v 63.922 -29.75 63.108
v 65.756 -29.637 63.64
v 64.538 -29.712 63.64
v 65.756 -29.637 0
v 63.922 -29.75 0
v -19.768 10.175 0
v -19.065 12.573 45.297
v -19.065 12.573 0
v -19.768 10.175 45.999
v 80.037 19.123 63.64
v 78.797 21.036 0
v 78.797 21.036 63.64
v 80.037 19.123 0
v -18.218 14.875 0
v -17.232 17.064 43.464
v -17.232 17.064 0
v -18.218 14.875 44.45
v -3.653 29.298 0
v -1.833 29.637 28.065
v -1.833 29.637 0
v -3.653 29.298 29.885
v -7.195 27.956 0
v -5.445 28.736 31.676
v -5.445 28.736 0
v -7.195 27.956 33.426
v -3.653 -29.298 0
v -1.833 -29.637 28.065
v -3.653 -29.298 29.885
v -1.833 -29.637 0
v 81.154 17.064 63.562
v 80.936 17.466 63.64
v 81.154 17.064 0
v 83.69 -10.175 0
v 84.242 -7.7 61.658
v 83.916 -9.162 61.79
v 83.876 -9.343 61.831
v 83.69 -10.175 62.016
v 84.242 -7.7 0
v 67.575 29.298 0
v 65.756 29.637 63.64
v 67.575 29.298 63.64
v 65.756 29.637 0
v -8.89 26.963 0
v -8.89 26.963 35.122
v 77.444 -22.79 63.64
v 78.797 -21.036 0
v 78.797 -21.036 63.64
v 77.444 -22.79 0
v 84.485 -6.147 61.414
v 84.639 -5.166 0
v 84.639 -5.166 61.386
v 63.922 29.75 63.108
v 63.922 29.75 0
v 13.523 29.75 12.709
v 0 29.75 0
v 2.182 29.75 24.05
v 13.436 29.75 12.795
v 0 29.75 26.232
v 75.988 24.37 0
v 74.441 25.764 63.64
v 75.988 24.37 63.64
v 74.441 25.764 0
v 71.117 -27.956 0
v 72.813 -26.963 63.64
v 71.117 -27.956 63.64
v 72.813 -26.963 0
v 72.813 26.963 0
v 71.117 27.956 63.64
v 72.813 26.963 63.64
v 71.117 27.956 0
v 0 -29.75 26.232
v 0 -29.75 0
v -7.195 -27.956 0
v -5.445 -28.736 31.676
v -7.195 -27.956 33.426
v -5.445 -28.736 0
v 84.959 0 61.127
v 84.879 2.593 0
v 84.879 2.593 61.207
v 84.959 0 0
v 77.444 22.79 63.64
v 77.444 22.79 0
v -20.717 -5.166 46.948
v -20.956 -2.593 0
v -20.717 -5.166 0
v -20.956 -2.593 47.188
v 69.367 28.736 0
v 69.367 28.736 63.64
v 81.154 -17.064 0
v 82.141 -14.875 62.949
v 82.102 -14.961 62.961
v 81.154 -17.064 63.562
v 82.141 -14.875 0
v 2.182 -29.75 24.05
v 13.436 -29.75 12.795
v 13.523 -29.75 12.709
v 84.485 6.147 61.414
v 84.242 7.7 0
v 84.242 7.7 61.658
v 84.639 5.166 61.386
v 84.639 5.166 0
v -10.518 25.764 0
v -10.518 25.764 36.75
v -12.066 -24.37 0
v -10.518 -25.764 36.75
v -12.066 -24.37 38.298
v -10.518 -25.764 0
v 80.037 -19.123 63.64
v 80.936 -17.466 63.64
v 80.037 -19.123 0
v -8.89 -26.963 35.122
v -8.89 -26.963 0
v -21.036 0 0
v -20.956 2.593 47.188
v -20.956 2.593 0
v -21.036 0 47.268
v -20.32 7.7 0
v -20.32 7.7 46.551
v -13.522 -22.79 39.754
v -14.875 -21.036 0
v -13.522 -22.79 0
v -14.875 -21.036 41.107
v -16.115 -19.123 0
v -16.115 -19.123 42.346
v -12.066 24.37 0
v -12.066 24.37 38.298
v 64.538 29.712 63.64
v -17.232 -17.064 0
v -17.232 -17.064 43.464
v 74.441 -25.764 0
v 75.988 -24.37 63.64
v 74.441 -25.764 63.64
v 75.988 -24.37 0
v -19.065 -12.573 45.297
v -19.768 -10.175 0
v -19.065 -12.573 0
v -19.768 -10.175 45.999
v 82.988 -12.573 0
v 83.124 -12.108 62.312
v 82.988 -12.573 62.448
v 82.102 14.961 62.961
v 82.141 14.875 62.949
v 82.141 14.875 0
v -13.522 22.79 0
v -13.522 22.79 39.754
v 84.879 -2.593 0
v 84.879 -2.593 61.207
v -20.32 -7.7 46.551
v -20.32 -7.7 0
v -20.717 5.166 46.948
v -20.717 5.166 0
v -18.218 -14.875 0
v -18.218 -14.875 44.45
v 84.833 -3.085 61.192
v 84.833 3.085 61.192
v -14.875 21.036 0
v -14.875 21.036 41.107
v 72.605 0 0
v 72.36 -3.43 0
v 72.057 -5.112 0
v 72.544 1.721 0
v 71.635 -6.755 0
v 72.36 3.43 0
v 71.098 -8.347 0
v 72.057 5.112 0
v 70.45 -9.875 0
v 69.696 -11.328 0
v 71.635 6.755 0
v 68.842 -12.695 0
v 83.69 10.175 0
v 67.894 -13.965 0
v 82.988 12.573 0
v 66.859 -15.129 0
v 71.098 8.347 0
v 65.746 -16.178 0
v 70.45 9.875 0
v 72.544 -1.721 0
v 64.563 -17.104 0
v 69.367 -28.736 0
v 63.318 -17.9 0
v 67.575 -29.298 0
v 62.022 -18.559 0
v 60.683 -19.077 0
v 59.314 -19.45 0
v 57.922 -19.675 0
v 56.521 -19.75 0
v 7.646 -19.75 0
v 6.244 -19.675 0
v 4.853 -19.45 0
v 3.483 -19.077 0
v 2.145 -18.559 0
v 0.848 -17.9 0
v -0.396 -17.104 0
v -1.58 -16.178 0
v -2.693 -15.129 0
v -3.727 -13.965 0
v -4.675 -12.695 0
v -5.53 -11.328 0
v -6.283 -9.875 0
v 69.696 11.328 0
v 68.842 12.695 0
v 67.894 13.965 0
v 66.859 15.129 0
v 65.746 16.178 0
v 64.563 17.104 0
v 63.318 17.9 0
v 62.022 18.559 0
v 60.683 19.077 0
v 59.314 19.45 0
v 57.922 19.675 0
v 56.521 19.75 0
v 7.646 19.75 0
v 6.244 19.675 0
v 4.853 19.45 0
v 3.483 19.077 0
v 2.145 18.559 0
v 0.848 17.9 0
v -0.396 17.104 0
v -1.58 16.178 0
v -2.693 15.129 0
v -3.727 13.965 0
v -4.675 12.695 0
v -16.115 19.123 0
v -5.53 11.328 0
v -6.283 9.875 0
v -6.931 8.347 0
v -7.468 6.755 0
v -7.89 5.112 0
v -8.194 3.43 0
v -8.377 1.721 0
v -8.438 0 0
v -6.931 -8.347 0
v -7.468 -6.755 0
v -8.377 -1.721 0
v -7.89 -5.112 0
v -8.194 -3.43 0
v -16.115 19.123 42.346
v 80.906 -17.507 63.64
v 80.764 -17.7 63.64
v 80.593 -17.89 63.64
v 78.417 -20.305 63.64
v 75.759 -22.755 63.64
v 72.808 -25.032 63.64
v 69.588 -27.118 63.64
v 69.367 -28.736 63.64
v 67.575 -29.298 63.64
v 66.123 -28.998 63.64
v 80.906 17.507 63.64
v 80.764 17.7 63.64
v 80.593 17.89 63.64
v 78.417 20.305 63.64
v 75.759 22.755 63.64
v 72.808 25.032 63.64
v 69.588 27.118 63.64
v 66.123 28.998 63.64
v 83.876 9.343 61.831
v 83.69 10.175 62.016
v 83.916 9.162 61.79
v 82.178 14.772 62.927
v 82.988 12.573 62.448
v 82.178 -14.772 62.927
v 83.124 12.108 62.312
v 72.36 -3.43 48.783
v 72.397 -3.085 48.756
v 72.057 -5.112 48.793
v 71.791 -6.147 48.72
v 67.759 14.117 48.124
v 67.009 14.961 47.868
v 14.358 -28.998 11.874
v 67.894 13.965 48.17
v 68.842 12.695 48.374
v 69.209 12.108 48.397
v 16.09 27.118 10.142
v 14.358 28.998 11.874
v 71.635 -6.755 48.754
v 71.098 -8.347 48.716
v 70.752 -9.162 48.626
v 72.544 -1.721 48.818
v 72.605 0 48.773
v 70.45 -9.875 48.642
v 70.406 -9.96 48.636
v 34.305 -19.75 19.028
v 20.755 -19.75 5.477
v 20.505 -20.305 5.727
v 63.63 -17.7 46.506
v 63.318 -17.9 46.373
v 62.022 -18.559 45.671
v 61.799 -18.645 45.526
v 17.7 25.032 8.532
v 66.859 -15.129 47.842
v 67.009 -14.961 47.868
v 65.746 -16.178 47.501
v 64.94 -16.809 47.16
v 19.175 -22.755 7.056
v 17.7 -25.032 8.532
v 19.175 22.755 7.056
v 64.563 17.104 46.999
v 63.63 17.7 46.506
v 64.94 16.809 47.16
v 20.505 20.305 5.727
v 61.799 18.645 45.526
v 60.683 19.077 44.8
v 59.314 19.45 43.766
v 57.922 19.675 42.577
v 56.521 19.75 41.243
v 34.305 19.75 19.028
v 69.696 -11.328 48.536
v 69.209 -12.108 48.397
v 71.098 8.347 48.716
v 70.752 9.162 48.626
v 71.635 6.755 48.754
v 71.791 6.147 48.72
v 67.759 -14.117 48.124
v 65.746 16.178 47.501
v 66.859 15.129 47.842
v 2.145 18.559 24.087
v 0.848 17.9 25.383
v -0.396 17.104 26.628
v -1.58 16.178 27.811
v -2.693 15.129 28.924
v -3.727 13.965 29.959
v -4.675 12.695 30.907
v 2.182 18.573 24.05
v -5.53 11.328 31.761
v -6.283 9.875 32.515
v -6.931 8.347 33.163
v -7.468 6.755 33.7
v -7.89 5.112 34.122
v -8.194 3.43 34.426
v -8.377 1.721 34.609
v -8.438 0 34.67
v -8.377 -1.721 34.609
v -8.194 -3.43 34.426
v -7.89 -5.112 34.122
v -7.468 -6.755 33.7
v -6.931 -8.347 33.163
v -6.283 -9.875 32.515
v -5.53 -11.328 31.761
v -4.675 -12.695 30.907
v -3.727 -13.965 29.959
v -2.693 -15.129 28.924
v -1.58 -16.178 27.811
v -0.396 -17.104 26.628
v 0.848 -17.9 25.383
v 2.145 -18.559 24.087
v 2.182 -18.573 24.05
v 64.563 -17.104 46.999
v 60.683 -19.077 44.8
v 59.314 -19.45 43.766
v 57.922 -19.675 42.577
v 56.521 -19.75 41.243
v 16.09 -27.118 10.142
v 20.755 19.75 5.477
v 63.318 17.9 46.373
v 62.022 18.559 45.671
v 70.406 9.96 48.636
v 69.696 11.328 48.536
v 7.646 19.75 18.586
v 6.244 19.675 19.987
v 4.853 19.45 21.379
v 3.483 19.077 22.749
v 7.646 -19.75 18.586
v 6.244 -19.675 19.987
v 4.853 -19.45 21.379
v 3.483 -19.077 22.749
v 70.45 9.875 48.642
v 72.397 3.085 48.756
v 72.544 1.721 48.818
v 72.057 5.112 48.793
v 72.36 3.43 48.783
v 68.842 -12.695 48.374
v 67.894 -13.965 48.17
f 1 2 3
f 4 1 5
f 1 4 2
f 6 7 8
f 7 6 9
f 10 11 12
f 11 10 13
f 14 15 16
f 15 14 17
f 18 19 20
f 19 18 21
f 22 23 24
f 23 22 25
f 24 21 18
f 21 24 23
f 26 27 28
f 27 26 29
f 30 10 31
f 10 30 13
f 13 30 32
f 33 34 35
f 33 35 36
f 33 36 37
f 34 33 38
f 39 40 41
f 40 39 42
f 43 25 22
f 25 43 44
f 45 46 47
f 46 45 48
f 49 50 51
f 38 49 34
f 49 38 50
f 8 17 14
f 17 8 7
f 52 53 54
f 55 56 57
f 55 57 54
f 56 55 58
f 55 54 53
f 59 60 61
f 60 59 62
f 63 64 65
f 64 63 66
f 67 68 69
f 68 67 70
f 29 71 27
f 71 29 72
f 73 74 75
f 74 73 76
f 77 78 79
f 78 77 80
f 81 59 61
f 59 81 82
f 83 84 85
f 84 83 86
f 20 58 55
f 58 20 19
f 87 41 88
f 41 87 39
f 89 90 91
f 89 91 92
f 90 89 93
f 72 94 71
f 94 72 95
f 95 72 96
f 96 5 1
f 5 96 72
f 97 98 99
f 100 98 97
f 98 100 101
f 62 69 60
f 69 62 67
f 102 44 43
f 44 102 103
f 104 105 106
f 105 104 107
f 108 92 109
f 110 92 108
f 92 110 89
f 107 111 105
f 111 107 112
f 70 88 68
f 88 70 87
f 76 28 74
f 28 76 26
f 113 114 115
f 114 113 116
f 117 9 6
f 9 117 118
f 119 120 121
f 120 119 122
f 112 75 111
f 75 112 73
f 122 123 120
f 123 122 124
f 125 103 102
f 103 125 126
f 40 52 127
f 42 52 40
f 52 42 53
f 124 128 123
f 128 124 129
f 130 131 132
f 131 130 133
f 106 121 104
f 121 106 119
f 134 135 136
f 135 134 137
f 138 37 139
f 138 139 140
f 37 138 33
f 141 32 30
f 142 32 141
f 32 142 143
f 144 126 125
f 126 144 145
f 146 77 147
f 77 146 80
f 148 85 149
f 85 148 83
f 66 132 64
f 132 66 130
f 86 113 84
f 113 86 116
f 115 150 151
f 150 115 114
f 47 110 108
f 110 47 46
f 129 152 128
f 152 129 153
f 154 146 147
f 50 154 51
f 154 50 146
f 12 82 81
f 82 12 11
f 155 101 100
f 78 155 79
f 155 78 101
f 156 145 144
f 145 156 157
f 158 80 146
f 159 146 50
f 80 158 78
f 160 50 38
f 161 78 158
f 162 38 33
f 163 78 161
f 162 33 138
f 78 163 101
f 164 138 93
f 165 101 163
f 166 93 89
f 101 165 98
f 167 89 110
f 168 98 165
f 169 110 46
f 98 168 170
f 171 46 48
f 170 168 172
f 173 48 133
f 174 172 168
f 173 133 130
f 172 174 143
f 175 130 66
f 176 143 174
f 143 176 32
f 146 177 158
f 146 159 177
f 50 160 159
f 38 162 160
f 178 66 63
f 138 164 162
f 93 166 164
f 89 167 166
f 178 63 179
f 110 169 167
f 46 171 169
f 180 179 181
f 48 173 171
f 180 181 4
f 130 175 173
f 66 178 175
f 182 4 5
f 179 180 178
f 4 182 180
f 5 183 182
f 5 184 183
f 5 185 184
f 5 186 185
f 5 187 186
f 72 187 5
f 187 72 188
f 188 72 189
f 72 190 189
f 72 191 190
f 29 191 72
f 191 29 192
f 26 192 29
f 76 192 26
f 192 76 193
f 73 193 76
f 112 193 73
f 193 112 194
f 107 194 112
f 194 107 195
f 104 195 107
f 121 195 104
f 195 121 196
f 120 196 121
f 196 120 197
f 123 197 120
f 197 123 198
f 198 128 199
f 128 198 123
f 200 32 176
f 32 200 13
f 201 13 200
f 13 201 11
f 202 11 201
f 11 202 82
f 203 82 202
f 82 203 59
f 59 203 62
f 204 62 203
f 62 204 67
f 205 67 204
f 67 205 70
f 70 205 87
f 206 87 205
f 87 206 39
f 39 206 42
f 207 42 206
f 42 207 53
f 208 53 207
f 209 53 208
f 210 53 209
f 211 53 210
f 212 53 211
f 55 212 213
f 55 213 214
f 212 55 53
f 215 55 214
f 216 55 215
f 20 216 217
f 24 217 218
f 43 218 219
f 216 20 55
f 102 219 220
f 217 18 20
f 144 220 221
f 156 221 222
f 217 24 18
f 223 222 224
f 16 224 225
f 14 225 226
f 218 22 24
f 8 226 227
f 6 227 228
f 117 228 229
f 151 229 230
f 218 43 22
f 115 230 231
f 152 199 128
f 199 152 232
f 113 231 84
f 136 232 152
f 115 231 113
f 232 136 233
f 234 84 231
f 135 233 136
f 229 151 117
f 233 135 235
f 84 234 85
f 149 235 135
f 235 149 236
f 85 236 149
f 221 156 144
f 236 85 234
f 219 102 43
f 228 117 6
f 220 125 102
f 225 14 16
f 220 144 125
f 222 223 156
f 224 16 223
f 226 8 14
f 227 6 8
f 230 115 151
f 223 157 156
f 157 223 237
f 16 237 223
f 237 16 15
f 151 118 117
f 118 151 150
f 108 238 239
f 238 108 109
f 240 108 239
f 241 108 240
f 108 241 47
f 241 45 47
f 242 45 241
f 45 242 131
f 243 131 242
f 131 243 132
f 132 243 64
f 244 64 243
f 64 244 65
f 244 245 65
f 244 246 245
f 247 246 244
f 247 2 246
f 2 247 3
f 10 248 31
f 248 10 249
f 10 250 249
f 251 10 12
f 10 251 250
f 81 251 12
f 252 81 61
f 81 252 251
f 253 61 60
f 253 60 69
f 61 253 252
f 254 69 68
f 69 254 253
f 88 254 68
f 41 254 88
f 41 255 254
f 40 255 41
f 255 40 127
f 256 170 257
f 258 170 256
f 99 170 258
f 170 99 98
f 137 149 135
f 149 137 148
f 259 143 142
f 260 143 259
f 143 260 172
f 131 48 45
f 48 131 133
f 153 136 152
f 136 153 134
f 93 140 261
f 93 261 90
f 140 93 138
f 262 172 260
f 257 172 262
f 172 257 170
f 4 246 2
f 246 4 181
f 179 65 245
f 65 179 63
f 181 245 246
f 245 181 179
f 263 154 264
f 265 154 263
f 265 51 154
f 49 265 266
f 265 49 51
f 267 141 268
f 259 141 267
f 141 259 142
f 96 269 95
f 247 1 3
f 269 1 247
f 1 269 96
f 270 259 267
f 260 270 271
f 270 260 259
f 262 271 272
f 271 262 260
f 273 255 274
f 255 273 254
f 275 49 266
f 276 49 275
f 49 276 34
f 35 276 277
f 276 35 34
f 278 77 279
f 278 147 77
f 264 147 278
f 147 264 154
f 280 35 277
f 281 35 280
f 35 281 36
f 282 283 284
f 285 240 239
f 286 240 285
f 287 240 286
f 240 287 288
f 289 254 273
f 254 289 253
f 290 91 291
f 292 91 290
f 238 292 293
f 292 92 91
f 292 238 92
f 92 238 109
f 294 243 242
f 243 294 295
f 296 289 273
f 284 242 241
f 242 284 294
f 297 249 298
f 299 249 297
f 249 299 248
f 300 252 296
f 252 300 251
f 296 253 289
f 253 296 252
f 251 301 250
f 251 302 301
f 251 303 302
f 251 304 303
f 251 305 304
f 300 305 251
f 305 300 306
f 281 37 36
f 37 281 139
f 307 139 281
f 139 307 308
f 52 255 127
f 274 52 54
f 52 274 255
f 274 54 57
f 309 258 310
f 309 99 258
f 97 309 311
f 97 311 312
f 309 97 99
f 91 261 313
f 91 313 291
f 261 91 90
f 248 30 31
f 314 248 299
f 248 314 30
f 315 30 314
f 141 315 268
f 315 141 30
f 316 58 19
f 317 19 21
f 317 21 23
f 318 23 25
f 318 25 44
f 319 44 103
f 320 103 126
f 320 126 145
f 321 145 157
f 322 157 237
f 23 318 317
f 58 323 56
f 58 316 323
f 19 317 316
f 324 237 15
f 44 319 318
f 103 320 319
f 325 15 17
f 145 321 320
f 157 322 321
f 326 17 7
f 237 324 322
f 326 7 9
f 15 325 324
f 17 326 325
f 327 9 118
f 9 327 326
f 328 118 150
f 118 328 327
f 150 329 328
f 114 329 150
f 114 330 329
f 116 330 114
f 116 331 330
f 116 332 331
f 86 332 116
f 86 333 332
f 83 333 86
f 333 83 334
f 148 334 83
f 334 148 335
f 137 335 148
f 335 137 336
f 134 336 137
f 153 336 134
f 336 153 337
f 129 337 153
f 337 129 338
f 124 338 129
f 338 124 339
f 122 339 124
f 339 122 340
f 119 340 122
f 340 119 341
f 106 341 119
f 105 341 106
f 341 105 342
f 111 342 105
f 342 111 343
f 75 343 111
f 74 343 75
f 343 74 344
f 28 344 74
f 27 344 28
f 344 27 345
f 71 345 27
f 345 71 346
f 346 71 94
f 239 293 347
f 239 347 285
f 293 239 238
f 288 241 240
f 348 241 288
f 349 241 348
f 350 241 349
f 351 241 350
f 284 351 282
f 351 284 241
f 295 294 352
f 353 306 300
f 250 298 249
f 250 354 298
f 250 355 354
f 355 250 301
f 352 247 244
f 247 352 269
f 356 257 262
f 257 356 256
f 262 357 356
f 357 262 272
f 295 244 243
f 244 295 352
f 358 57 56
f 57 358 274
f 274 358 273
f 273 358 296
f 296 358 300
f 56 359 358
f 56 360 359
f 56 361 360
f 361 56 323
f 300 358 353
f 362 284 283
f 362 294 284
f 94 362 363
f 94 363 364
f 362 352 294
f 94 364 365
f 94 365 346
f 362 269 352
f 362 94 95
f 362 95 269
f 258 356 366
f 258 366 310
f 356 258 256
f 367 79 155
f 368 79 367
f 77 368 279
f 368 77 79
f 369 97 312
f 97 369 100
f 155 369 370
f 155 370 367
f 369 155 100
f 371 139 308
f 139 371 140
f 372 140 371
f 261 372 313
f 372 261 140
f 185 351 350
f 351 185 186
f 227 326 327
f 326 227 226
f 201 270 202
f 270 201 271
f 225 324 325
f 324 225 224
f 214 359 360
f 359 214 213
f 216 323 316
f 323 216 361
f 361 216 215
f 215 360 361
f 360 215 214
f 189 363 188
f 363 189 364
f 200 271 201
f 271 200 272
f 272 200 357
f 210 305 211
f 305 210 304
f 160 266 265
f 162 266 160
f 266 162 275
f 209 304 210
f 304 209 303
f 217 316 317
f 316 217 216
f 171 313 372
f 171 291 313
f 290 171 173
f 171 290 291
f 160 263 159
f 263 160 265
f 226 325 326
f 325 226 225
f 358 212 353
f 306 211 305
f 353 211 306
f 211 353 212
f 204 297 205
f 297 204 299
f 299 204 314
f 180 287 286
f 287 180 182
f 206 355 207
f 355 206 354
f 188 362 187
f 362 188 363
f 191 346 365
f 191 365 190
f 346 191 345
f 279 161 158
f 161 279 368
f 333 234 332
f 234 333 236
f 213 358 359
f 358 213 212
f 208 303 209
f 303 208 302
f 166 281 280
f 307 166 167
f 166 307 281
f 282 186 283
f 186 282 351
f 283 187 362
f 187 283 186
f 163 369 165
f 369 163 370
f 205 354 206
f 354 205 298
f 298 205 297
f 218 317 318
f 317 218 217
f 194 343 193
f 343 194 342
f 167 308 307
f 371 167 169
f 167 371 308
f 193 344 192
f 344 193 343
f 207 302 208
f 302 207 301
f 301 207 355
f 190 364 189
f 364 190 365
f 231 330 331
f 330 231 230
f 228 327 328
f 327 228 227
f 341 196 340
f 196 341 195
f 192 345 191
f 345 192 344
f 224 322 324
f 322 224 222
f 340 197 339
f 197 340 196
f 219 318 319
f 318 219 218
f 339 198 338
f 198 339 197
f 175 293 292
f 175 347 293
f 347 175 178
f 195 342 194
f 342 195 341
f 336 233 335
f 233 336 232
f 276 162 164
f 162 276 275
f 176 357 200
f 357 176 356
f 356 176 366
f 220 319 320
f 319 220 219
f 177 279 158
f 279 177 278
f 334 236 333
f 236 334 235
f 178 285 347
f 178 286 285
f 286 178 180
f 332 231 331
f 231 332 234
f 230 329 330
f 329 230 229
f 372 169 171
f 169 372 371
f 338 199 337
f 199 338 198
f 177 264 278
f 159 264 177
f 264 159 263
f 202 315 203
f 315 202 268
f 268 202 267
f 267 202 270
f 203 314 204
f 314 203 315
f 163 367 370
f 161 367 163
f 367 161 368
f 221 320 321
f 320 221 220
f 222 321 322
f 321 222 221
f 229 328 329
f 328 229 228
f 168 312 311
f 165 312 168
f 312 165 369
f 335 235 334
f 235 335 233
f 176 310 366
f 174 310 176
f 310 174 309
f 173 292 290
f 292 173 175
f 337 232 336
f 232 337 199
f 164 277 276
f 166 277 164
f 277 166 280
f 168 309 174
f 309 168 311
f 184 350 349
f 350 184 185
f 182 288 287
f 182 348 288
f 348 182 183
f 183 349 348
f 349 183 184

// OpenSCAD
// -*- mode: SCAD ; c-file-style: "ellemtel" ; coding: utf-8 -*-
//
// NN
//
// © 2018 Roland Sieker <ospalh@gmail.com>
// Licence: CC-BY-SA 4.0


glass_diameter = 70; // [30:1:100]
glass_height = 90; // [20:1:200]
angle = 45; // [20:1:70]

// Percent of glass diameter
wedge_width = 85; // [50:1:99]

// How much border to be left
wedge_cutout_width = 10;

// Set this to “render” and click on “Create Thing” when done with the setup.
preview = 1; // [0:render, 1:preview]



/* [Hidden] */

// Done with the customizer

// *******************************************************
// Extra parameters. These can be changed reasonably safely.


w = 1.8;  // Wall width
p = 1.2;  // Bottom, top plate height
c = 0.4;  // Clearance

// *******************************************************
// Some shortcuts. These shouldn’t be changed

r_ge = glass_diameter/2 + c;
r_w = glass_diameter/2 * wedge_width/100;

tau = 2 * PI;  // π is still wrong. τ = ⌀ ÷ r

xy_factor = 1/tan(angle);
// To get from a height to a horizontal width inclined correctly
z_factor = tan(angle);  // The other way around
hb = glass_height*sin(angle);


ms = 0.01;  // Muggeseggele.

// fn for differently sized objects and fs, fa; all for preview or rendering.
pna = 40;
pnb = 15;
pa = 5;
ps = 1;
rna = 180;
rnb = 30;
ra = 1;
rs = 0.1;
function na() = (preview) ? pna : rna;
function nb() = (preview) ? pnb : rnb;
$fs = (preview) ? ps : rs;
$fa = (preview) ? pa : ra;

// *******************************************************
// End setup



// *******************************************************
// Generate the parts

glass_wedge();

// *******************************************************
// Code for the parts themselves


module glass_wedge()
{
   hc = r_ge*sin(angle) + p;
   difference()
   {
      glass_base();
      translate([0,0, hc])
      {
         glass_cutout();
      }
      inner_cutout();
   }
}

module glass_cutout()
{
   rotate([0,angle,0])
   {
      hull()
      {
         cylinder(r=r_ge, h=glass_height);
         translate([-r_ge-glass_height,0,0])
         {
            cylinder(r=r_ge, h=glass_height);
         }
      }
   }

}

module glass_base()
{
   linear_extrude(hb)
   {
      2d_glass_base();
   }
}



module 2d_glass_base()
{
   projection()
   {
      rotate([0,angle,0])
      {
         cylinder(r=r_w, h=glass_height+c);
      }
   }
}

module inner_cutout()
{
   translate([0,0,-ms])
   {
      linear_extrude(hb+2*ms)
      {
         2d_inner_cutout();
      }
   }
}

module 2d_inner_cutout()
{
   sy = (r_w-wedge_cutout_width)/r_w;
   lh = cos(angle)*(glass_height+c);
   lx = sin(angle)*r_w+lh;
   sx = (lx-2*wedge_cutout_width)/lx;

   // I think this is not really correct (or the way i wanted it), but,
   // meh, good enough.
   translate([sx*wedge_cutout_width,0])
   {
      scale([sx,sy])
      {
         2d_glass_base();
      }
   }
}
